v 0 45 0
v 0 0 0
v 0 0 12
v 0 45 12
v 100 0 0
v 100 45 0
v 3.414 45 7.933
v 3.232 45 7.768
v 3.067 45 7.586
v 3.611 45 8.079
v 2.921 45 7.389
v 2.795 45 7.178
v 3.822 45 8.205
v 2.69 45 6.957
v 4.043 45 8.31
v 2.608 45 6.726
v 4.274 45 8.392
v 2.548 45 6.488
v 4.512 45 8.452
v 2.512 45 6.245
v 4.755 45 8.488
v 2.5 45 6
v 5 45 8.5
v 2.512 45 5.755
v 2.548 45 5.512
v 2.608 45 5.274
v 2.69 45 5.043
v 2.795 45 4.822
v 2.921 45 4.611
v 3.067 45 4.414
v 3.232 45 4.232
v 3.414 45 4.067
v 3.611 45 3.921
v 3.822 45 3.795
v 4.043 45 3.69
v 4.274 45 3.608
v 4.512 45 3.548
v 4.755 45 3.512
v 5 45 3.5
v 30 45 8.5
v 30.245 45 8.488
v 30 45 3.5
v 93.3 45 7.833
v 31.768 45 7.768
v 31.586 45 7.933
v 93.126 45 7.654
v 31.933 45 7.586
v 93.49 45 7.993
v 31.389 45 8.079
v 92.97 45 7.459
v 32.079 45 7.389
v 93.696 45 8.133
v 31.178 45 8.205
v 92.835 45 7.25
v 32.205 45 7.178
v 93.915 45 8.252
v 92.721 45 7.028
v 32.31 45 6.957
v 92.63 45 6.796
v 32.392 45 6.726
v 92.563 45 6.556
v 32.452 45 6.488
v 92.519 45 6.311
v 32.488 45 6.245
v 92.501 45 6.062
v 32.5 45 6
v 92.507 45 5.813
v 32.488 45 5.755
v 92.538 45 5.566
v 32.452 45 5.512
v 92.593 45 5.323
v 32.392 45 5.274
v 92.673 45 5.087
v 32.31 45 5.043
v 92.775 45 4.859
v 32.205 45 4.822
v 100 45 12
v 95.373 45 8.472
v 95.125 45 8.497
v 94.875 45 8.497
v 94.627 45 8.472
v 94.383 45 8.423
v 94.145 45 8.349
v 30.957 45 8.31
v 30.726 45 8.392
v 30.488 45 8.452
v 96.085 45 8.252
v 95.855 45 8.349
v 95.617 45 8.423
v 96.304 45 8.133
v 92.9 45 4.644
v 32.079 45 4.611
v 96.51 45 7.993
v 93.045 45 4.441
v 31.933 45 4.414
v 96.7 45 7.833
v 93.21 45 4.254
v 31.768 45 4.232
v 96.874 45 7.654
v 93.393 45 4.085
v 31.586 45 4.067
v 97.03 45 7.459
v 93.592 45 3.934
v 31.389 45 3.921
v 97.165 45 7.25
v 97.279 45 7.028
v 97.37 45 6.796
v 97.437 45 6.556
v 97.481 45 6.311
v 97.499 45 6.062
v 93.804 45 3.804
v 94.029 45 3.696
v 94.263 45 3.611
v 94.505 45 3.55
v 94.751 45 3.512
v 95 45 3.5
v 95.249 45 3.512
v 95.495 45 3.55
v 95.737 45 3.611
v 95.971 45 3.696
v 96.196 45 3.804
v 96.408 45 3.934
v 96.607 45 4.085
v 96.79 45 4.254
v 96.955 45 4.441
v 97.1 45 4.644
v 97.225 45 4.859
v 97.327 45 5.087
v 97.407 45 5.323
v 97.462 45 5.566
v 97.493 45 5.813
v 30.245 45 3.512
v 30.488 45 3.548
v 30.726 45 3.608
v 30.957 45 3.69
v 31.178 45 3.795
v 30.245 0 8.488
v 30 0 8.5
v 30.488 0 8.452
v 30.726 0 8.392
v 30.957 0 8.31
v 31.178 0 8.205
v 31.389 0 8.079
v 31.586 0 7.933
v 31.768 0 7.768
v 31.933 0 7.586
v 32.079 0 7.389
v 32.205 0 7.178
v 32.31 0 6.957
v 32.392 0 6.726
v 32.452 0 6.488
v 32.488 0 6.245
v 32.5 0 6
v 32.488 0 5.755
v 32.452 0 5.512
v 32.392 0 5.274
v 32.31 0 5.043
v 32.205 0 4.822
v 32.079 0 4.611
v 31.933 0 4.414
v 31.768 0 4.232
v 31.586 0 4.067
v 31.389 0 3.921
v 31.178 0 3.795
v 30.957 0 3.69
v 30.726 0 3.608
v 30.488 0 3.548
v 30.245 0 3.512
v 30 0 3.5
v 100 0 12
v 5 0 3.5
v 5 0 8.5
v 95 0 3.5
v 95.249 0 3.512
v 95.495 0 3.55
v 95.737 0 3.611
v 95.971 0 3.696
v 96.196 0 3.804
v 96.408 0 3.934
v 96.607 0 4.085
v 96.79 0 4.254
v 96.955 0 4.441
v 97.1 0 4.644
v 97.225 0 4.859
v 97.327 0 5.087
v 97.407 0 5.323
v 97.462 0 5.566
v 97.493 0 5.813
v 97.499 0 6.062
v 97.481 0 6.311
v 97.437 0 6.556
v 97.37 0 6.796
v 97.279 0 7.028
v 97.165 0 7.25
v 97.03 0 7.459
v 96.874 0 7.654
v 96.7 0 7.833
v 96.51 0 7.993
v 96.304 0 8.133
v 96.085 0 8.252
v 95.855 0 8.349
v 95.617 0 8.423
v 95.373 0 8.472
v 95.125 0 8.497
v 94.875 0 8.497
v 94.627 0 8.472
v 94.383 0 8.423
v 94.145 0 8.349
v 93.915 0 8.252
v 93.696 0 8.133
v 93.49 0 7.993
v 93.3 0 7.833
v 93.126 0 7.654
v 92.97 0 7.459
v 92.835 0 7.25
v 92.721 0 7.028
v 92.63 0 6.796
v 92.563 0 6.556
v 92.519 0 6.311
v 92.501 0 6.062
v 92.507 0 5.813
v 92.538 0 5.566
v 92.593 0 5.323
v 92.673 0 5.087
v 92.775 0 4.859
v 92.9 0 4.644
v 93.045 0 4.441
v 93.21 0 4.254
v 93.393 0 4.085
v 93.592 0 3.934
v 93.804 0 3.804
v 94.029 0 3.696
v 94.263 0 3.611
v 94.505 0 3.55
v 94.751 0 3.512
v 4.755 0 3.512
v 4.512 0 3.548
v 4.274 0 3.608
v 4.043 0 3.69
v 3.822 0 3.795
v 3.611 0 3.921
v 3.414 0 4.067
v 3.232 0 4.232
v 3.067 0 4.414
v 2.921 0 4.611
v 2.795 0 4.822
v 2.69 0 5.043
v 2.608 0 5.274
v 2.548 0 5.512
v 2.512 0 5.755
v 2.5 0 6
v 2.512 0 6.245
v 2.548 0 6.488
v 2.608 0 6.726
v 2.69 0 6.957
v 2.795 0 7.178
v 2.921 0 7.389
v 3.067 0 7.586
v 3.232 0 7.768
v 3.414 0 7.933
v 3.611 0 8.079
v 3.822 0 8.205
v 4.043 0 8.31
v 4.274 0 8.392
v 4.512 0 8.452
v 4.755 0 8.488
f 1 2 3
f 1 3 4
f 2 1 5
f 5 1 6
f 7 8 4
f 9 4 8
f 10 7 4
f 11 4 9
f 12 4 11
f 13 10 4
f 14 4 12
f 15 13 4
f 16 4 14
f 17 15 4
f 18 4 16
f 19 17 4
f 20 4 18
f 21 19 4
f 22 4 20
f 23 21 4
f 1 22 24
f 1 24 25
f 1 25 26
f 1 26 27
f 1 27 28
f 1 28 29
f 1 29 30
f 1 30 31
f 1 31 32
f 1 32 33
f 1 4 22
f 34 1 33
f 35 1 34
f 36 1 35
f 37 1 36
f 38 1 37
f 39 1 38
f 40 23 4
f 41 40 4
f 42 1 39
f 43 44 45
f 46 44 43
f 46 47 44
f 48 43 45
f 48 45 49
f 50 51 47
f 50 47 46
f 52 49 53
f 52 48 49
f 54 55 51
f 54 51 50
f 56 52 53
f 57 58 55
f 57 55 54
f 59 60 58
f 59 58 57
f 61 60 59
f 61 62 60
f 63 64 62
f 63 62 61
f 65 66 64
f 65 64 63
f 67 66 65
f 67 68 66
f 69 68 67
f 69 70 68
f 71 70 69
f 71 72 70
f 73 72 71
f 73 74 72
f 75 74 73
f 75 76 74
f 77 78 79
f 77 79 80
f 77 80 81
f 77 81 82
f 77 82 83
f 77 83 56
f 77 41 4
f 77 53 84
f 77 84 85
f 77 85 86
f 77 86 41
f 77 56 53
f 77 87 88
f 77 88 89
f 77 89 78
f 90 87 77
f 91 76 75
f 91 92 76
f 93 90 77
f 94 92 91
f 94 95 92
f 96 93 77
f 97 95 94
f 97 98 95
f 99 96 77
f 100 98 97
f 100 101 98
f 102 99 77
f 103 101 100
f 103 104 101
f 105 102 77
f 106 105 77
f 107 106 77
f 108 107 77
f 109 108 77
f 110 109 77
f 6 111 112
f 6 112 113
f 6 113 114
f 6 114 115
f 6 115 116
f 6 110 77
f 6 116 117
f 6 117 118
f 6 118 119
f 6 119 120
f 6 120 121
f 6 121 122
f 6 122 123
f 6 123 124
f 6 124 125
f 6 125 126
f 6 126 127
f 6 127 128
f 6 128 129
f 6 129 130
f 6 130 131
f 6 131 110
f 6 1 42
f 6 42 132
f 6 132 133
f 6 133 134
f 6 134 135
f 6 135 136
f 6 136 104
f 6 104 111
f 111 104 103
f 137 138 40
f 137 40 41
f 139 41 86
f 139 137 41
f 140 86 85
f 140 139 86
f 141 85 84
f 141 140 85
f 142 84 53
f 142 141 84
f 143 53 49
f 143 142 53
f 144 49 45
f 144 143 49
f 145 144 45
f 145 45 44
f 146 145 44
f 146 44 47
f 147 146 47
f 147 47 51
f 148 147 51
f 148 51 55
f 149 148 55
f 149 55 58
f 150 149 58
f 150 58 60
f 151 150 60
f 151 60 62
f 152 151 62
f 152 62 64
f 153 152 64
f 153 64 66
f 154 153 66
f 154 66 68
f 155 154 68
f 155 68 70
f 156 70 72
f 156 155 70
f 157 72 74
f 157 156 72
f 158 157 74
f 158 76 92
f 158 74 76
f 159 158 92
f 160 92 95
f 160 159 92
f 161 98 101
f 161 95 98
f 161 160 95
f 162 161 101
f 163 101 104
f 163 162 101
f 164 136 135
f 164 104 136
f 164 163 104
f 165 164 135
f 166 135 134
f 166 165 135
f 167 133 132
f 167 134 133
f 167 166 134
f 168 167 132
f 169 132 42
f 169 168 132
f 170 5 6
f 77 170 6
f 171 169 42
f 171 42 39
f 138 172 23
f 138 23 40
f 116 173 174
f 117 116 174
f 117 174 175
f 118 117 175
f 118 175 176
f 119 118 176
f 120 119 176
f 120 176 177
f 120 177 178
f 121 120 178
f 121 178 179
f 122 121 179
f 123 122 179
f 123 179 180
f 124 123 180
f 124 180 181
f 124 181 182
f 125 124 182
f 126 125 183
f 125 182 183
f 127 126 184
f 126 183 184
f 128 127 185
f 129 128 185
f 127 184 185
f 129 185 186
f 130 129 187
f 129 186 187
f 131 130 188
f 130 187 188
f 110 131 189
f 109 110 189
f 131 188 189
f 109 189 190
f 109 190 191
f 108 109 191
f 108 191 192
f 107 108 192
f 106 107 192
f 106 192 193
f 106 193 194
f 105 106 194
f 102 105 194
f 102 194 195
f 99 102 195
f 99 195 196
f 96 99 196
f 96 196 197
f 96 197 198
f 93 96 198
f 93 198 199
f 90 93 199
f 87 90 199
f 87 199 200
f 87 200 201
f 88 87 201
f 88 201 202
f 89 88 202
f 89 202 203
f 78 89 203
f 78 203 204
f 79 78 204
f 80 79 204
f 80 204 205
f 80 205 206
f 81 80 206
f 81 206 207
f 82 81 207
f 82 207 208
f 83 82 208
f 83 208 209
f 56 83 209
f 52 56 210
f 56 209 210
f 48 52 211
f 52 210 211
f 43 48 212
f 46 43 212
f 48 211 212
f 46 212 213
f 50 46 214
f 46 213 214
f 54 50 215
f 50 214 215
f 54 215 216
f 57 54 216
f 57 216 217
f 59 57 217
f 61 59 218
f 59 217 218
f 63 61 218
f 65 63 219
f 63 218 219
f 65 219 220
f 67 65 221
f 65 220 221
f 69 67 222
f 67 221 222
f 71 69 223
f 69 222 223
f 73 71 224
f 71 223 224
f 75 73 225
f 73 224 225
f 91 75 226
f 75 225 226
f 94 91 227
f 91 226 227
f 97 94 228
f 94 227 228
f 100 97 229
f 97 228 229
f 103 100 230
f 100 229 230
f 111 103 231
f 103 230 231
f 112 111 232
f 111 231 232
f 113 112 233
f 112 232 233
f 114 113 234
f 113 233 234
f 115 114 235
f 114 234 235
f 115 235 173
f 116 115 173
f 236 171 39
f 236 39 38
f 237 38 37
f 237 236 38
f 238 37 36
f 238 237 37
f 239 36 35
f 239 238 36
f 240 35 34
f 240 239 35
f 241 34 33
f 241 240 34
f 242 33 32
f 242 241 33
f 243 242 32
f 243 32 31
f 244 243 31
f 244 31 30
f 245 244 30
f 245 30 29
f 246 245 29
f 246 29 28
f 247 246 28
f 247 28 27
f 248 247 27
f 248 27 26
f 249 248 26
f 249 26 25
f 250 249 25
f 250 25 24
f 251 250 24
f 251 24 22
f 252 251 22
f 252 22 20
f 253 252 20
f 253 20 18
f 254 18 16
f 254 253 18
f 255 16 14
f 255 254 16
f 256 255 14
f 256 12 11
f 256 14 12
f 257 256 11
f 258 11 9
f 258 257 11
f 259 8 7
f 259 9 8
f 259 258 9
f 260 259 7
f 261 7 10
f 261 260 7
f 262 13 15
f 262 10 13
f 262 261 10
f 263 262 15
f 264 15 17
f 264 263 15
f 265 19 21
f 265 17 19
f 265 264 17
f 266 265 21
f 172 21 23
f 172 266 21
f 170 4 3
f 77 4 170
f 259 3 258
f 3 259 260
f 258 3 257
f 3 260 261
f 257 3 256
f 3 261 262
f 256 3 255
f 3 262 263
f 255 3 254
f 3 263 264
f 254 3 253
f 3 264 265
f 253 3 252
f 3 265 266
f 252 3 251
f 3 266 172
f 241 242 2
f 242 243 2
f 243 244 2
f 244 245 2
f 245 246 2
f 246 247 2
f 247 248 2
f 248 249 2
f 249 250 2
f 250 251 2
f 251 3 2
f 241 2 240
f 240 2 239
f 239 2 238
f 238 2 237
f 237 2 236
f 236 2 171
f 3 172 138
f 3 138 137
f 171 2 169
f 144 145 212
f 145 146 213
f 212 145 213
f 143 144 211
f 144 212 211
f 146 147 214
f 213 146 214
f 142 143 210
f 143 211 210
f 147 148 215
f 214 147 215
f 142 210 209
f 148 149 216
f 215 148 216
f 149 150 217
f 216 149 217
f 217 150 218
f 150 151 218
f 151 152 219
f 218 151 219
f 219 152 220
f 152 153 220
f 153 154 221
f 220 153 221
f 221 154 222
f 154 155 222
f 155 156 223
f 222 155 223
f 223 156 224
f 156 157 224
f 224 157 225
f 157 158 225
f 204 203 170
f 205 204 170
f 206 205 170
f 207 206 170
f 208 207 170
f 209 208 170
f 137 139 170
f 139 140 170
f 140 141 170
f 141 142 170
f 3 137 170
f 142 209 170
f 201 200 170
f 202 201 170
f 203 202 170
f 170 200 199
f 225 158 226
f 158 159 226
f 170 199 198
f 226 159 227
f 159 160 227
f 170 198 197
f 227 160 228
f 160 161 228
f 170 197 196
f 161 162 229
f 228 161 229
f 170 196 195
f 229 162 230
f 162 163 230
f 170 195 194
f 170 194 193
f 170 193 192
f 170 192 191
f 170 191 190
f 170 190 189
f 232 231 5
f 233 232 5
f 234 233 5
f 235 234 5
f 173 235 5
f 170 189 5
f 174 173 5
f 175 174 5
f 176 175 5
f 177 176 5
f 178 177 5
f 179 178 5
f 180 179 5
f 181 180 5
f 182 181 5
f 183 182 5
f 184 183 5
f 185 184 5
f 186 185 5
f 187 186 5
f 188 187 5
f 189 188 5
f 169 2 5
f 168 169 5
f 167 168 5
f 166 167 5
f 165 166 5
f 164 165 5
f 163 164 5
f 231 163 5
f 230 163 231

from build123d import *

# Parameters (mm, degrees)
SKETCH3_W           = 100
SKETCH3_H           = 45
BOSS_EXTRUDE2_DEPTH = 12
SKETCH4_R           = 2.5
CUT_EXTRUDE1_DEPTH  = 111.313190508


with BuildPart() as part:
    # Sketch3 → Boss-Extrude2 (new body)
    with BuildSketch(Plane.XY):
        with Locations((50, 22.5)):
            Rectangle(SKETCH3_W, SKETCH3_H)
    extrude(amount=BOSS_EXTRUDE2_DEPTH)

    # Sketch4 → Cut-Extrude1 (cut, through all)
    with BuildSketch(Plane.XZ):
        with Locations(Location((95, 6, 0), (0, 0, 270))):
            Circle(SKETCH4_R)
        with BuildLine():
            Line((30, 3.5), (5, 3.5))
            ThreePointArc((5, 3.5), (2.5, 6), (5, 8.5))
            Line((5, 8.5), (30, 8.5))
            ThreePointArc((30, 8.5), (32.5, 6), (30, 3.5))
        make_face()
    extrude(amount=-CUT_EXTRUDE1_DEPTH, mode=Mode.SUBTRACT)


solid = part.part
